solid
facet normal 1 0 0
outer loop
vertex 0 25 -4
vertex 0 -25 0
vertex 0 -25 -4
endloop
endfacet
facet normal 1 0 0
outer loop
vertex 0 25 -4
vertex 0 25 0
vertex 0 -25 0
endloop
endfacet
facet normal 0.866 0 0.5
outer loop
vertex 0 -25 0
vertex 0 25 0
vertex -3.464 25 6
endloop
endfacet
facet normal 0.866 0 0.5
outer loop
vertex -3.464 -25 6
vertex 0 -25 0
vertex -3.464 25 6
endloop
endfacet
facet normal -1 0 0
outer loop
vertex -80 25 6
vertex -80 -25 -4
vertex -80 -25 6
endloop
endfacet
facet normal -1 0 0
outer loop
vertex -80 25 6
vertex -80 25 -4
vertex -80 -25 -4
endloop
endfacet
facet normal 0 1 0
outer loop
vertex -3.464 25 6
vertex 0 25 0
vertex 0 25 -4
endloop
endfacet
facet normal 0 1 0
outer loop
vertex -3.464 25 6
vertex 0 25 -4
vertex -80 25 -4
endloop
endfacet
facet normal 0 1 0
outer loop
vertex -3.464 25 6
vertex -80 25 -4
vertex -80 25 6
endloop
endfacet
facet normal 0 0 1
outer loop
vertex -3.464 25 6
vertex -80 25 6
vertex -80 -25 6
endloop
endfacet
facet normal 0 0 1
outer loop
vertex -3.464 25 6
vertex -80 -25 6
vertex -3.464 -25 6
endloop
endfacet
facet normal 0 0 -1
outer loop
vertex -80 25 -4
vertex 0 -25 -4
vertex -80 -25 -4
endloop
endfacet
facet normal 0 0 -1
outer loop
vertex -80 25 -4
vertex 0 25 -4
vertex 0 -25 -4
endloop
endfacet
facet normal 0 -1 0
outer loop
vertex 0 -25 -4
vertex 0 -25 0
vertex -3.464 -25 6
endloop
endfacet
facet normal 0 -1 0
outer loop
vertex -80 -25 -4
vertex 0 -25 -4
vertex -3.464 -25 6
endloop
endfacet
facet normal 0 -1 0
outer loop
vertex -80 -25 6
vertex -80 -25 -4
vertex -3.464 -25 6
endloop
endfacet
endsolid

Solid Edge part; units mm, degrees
sketch "Sketch1" plane through (0, 0, 0) normal (0, -1, 0) x (1, 0, 0)
  line L0 (-80, 6) -> (-3.4641, 6)
  line L1 (0, 0) -> (-3.4641, 6)
  line L2 (0, 0) -> (0, -4)
  line L3 (0, -4) -> (-80, -4)
  line L4 (-80, -4) -> (-80, 6)
extrude "Protrusion1" add sketch "Sketch1" along normal mid plane 50
